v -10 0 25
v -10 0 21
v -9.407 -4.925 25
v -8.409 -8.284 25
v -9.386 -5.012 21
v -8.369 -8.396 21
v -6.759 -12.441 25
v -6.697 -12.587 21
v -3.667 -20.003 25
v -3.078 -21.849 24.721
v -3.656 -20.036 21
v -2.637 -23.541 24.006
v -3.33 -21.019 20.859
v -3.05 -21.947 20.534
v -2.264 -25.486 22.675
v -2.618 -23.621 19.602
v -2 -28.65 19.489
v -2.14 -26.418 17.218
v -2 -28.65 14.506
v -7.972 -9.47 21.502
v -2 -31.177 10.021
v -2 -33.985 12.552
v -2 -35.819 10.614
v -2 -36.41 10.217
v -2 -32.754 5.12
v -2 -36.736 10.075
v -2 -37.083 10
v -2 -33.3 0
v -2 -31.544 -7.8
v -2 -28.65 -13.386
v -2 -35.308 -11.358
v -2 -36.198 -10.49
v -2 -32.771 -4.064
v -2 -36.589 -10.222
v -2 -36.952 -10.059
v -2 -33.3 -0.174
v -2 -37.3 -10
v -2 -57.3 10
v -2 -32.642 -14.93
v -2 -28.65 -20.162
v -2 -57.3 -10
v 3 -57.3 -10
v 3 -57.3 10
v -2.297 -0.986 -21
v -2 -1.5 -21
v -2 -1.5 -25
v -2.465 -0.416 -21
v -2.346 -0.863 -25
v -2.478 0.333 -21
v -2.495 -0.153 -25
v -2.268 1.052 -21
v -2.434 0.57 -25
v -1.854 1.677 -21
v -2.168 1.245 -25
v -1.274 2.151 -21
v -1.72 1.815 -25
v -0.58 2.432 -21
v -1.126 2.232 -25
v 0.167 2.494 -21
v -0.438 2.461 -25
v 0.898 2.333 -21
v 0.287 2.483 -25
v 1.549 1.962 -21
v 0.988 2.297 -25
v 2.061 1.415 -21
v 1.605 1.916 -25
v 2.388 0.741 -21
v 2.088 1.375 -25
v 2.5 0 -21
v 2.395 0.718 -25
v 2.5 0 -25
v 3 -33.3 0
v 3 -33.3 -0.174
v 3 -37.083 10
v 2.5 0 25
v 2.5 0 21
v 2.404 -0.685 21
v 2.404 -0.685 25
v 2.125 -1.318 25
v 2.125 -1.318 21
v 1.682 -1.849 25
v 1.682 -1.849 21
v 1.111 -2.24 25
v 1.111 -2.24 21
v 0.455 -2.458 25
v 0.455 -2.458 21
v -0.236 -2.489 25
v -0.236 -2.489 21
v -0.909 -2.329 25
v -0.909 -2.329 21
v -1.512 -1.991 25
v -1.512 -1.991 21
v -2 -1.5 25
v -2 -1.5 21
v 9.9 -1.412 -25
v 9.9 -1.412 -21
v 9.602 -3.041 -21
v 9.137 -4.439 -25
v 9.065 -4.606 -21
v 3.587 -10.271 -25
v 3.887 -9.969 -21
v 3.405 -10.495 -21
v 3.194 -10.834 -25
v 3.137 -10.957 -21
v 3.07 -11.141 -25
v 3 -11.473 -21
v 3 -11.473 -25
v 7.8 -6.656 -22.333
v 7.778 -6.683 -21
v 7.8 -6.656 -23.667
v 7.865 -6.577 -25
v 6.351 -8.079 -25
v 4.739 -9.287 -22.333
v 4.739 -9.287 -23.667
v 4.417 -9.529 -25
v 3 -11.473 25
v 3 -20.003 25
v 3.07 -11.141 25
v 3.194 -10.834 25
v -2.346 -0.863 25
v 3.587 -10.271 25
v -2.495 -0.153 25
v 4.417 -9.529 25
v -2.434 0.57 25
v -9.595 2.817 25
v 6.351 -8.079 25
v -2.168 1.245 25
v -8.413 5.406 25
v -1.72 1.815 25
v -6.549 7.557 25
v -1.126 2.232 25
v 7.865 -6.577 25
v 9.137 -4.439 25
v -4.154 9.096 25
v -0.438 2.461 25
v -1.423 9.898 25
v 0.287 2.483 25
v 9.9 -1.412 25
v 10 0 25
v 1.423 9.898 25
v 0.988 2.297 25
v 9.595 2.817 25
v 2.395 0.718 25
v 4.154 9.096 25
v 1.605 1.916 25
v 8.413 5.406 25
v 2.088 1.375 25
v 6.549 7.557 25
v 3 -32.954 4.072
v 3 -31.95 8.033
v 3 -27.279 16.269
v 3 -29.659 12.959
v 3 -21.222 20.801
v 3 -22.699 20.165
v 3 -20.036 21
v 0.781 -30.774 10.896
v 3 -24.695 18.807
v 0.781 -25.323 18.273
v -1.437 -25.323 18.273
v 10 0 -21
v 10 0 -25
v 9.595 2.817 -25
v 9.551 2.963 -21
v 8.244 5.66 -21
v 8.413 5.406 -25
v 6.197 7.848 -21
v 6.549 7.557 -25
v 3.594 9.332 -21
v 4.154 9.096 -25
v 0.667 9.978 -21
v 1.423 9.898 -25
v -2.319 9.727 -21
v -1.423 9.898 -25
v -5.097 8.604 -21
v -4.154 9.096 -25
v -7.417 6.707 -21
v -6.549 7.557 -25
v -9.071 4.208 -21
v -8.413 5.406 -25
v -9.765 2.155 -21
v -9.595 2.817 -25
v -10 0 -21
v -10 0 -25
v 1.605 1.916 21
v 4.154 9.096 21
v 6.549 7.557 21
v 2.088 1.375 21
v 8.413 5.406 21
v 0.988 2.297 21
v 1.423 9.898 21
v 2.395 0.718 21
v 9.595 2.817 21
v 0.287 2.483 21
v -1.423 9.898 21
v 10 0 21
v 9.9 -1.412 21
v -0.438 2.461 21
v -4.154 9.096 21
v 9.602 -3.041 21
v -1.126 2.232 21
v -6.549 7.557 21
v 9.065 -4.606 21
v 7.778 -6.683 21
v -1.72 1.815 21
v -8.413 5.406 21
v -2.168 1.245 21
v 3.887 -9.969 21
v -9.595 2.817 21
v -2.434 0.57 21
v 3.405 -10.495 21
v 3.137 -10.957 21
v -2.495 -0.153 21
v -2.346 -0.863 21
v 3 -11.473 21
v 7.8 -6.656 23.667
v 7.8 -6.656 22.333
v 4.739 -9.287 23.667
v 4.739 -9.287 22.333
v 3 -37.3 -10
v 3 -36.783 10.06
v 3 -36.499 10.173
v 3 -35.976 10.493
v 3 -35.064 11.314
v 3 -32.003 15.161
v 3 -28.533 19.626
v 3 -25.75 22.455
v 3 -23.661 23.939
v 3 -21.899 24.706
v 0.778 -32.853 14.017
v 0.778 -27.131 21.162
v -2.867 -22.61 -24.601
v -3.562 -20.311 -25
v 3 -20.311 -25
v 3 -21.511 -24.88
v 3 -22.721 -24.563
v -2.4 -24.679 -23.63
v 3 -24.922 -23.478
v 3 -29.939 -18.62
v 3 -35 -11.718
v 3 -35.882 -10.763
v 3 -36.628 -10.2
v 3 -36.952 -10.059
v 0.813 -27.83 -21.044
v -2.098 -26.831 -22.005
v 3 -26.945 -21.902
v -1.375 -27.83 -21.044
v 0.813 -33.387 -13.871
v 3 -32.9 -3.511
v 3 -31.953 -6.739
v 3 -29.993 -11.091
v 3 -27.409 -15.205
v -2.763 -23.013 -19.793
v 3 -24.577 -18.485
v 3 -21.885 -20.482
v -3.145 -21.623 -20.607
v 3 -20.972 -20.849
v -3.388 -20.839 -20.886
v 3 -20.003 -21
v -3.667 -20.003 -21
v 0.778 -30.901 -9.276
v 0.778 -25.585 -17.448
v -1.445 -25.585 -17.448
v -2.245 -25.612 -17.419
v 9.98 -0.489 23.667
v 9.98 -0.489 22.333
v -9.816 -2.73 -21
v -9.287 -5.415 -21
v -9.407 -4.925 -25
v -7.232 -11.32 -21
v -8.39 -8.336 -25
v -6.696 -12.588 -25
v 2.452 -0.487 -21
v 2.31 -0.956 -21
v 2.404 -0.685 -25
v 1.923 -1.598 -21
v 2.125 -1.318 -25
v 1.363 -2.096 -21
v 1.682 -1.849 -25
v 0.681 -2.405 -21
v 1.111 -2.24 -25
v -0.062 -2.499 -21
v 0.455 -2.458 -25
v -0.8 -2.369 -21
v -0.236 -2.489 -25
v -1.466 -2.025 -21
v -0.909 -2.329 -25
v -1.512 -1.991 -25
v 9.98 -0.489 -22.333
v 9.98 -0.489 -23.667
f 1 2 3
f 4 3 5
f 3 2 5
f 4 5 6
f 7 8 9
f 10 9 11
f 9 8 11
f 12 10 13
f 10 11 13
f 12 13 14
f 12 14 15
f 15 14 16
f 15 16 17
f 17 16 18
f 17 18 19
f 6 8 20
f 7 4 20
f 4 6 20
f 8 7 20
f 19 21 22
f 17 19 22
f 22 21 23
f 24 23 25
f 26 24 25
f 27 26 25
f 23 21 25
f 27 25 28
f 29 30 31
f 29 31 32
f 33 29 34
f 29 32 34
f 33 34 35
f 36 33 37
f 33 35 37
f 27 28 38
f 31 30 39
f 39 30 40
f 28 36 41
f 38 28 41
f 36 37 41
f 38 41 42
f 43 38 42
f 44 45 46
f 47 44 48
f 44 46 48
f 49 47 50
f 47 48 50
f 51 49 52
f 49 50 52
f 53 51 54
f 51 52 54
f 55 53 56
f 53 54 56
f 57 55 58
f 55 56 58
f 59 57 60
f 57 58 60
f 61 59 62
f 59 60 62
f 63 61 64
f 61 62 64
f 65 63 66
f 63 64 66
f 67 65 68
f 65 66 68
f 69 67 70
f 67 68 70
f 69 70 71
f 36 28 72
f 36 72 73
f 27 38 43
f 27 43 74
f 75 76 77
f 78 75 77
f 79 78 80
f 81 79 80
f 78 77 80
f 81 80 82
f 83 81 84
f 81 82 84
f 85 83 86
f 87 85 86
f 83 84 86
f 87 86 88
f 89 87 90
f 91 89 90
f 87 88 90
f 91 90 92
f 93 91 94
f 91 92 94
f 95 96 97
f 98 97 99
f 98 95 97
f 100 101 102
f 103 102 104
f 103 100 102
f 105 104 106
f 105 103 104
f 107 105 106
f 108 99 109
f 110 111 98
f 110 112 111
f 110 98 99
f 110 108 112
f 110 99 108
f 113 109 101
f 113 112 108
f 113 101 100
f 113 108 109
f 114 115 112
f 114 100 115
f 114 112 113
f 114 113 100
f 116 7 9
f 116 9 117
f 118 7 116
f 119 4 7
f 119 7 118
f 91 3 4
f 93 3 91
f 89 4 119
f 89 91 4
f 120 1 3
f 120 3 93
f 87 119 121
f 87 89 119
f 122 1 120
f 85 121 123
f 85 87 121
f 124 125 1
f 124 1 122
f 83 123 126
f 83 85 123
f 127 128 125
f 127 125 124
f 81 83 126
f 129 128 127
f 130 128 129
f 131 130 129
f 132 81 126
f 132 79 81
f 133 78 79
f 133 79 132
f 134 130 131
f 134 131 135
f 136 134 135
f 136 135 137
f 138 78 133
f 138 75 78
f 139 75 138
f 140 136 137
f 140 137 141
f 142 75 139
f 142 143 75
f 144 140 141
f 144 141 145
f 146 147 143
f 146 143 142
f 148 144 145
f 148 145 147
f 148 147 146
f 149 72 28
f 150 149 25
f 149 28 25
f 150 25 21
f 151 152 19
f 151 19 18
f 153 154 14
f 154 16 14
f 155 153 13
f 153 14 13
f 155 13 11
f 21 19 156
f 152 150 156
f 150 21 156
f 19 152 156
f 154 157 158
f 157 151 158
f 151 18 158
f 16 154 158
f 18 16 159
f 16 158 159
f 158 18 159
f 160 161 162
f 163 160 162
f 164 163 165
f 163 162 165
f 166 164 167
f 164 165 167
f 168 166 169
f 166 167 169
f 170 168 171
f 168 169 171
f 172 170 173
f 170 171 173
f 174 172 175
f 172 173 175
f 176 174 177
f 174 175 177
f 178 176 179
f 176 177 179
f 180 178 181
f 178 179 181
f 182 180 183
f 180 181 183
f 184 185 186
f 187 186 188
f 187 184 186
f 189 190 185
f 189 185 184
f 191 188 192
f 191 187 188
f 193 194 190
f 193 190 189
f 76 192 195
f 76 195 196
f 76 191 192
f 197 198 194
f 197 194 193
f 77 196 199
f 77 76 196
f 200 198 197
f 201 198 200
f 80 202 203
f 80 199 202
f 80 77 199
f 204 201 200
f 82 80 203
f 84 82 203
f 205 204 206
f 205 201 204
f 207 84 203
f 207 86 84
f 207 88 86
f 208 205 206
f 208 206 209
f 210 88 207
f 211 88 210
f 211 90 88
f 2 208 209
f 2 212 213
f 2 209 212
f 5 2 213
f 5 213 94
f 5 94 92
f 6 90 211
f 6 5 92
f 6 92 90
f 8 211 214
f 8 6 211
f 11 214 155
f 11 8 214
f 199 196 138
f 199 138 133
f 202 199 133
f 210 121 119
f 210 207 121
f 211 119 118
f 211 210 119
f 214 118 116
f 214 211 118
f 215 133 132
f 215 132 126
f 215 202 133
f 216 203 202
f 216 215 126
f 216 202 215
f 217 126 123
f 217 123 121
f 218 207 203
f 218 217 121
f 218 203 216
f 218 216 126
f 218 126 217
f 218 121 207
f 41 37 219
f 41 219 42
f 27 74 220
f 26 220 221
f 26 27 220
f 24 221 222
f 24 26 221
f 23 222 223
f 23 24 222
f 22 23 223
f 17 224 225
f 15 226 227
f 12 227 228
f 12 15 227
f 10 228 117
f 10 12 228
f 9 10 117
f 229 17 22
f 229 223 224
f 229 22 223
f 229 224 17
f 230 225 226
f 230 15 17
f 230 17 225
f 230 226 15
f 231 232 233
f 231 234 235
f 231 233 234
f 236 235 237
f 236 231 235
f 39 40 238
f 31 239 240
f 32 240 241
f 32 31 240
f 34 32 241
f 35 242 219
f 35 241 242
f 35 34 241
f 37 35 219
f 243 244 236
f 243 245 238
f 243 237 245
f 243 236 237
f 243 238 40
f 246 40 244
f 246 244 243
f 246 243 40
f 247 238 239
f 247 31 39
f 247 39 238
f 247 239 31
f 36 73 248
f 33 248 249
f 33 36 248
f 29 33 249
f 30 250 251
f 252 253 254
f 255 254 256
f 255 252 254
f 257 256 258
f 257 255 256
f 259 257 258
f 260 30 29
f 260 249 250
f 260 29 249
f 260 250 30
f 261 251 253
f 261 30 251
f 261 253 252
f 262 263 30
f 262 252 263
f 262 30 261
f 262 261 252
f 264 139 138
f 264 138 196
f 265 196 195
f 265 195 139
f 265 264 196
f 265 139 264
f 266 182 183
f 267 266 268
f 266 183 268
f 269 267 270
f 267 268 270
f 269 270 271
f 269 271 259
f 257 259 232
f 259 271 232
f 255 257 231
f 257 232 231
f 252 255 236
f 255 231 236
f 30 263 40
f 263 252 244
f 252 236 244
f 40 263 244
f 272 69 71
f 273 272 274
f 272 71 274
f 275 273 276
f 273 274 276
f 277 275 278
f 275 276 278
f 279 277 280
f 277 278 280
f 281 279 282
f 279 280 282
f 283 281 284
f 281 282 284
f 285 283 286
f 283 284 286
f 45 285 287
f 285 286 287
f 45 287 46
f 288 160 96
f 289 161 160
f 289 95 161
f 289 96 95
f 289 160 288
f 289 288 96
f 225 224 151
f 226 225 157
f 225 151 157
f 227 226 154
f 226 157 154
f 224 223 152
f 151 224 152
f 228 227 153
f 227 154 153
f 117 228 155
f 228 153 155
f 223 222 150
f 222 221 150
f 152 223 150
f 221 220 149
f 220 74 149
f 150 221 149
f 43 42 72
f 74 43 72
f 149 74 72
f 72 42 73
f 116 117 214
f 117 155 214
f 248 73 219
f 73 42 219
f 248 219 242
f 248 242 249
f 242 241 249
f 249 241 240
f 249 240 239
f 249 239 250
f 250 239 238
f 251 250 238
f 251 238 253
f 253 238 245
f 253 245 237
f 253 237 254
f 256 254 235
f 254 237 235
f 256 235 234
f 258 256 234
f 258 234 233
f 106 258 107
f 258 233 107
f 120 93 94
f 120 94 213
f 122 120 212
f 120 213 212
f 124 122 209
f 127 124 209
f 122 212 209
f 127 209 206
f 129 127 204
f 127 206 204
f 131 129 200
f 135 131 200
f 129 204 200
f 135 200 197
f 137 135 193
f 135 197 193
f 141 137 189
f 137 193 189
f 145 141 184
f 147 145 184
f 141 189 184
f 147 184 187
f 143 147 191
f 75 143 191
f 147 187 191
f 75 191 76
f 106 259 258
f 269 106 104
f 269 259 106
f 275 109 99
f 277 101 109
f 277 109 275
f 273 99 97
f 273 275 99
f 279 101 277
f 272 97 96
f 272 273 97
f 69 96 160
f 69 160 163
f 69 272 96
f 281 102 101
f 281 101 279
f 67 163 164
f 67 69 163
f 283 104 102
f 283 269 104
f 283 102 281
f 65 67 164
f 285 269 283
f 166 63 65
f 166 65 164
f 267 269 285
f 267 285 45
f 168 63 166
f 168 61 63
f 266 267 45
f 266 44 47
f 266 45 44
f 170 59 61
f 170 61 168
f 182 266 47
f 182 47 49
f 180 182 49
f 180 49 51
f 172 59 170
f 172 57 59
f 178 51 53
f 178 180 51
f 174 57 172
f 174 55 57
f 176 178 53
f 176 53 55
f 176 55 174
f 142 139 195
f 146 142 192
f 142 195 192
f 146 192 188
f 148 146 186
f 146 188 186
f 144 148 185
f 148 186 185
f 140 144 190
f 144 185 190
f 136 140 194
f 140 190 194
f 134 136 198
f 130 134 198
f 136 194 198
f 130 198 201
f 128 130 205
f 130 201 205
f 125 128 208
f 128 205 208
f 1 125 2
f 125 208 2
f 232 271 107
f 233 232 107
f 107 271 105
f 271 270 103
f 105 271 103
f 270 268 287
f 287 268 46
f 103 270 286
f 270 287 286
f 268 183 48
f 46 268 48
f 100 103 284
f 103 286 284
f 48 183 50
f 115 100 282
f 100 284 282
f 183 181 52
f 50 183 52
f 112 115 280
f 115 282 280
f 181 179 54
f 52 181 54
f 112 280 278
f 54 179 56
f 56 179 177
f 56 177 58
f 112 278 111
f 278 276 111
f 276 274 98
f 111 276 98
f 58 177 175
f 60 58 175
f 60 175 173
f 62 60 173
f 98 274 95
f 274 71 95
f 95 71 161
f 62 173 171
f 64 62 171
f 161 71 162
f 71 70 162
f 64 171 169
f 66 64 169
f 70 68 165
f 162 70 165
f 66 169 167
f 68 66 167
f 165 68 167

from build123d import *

# Parameters (mm, degrees)
BOSS_EXTRU_1_DEPTH      = 50
ENL_V_START             = -13.000137383
ENL_V_MAT_EXTRU_1_DEPTH = 20.000137383


# Read off the part's stored shape, not the designer's step: Enlèv. mat.-Extru.1
with BuildPart() as part:
    # Esquisse1 → Boss.-Extru.1 (new body)
    with BuildSketch(Plane.XY.offset(-25)):
        with BuildLine():
            Line((-2, -28.65), (-2, -9.797958971))
            ThreePointArc((-2, -9.797958971), (-7.745966692, -6.32455532), (-10, 0))
            add(Edge.make_bspline(
                [(-10, 0), (-10.038102543, -9.915248827), (-2.132148039, -18.010708935), (-2, -28.65)],
                knots=[0, 0, 0, 0, 1, 1, 1, 1], degree=3))
        make_face()
        with BuildLine():
            Line((3, -11.472816521), (3, -9.539392014))
            ThreePointArc((3, -9.539392014), (0.516443819, -9.986655385), (-2, -9.797958971))
            Line((-2, -9.797958971), (-2, -28.65))
            Line((-2, -28.65), (-2, -57.3))
            Line((-2, -57.3), (3, -57.3))
            Line((3, -57.3), (3, -11.472816521))
        make_face()
        with BuildLine():
            ThreePointArc((9.899806533, -1.412030667), (7.623303271, -6.471881275), (3, -9.539392014))
            Line((3, -9.539392014), (3, -11.472816521))
            add(Edge.make_bspline(
                [(9.899806533, -1.412030667), (9.042464712, -8.684319248), (3.317345852, -8.787272714), (3, -11.472816521)],
                knots=[0.05745519, 0.05745519, 0.05745519, 0.05745519, 1, 1, 1, 1], degree=3))
        make_face()
        with BuildLine():
            ThreePointArc((-2, -1.5), (-0.790569415, 2.371708245), (2.5, 0))
            Line((2.5, 0), (3, 0))
            Line((3, 0), (3, -9.539392014))
            ThreePointArc((3, -9.539392014), (7.623303271, -6.471881275), (9.899806533, -1.412030667))
            add(Edge.make_bspline(
                [(10, 0), (9.986241611, -0.498789425), (9.952067961, -0.968730021), (9.899806533, -1.412030667)],
                knots=[0, 0, 0, 0, 0.05745519, 0.05745519, 0.05745519, 0.05745519], degree=3))
            ThreePointArc((10, 0), (0, 10), (-10, 0))
            ThreePointArc((-10, 0), (-7.745966692, -6.32455532), (-2, -9.797958971))
            Line((-2, -9.797958971), (-2, -1.5))
        make_face()
        with BuildLine():
            Line((3, 0), (2.5, 0))
            ThreePointArc((2.5, 0), (0.790569415, -2.371708245), (-2, -1.5))
            Line((-2, -1.5), (-2, -9.797958971))
            ThreePointArc((-2, -9.797958971), (0.516443819, -9.986655385), (3, -9.539392014))
            Line((3, -9.539392014), (3, 0))
        make_face()
    extrude(amount=BOSS_EXTRU_1_DEPTH)

    # Enlèv. mat.-Extru.1 outline → Enlèv. mat.-Extru.1 (cut)
    with BuildSketch(Plane(origin=(3, 0, 0), x_dir=(0, 0, -1), z_dir=(1, 0, 0)).offset(ENL_V_START)):
        with BuildLine():
            Line((-25, -57.3), (-10, -57.3))
            Line((-10, -57.3), (-10, -37.083079187))
            add(Edge.make_bspline(
                [(-10, -37.083079187), (-10.308820918, -33.626949696), (-24.959081539, -27.805521116), (-25, -20.002816521)],
                knots=[0.33438903, 0.33438903, 0.33438903, 0.33438903, 1.313600201, 1.313600201, 1.313600201, 1.313600201], degree=3))
            Line((-25, -20.002816521), (-25, -57.3))
        make_face()
        with BuildLine():
            Line((10, -37.3), (10, -57.3))
            Line((10, -57.3), (25, -57.3))
            Line((25, -57.3), (25, -20.310673404))
            add(Edge.make_bspline(
                [(25, -20.310673404), (24.825306853, -28.916467162), (10.047414043, -34.103142781), (10, -37.3)],
                knots=[0.656671032, 0.656671032, 0.656671032, 0.656671032, 1.644941889, 1.644941889, 1.644941889, 1.644941889], degree=3))
        make_face()
        with BuildLine():
            add(Edge.make_bspline(
                [(0.174087167, -33.300000001), (8.510773732, -33.241503729), (20.989133498, -24.836380481), (20.999995082, -20.00281651)],
                knots=[0.00693536, 0.00693536, 0.00693536, 0.00693536, 0.999807124, 0.999807124, 0.999807124, 0.999807124], degree=3))
            Line((20.999995082, -20.00281651), (21, 10.000000033))
            Line((21, 10.000000033), (-21, 10))
            Line((-21, 10), (-21.000000005, -20.035970331))
            add(Edge.make_bspline(
                [(0, -33.3), (-12.278821067, -33.266087617), (-20.974999639, -24.210992728), (-21.000000005, -20.035970331)],
                knots=[0, 0, 0, 0, 0.99712668, 0.99712668, 0.99712668, 0.99712668], degree=3))
            Line((0, -33.3), (0.174087167, -33.300000001))
        make_face()
    extrude(amount=ENL_V_MAT_EXTRU_1_DEPTH, mode=Mode.SUBTRACT)


solid = part.part
